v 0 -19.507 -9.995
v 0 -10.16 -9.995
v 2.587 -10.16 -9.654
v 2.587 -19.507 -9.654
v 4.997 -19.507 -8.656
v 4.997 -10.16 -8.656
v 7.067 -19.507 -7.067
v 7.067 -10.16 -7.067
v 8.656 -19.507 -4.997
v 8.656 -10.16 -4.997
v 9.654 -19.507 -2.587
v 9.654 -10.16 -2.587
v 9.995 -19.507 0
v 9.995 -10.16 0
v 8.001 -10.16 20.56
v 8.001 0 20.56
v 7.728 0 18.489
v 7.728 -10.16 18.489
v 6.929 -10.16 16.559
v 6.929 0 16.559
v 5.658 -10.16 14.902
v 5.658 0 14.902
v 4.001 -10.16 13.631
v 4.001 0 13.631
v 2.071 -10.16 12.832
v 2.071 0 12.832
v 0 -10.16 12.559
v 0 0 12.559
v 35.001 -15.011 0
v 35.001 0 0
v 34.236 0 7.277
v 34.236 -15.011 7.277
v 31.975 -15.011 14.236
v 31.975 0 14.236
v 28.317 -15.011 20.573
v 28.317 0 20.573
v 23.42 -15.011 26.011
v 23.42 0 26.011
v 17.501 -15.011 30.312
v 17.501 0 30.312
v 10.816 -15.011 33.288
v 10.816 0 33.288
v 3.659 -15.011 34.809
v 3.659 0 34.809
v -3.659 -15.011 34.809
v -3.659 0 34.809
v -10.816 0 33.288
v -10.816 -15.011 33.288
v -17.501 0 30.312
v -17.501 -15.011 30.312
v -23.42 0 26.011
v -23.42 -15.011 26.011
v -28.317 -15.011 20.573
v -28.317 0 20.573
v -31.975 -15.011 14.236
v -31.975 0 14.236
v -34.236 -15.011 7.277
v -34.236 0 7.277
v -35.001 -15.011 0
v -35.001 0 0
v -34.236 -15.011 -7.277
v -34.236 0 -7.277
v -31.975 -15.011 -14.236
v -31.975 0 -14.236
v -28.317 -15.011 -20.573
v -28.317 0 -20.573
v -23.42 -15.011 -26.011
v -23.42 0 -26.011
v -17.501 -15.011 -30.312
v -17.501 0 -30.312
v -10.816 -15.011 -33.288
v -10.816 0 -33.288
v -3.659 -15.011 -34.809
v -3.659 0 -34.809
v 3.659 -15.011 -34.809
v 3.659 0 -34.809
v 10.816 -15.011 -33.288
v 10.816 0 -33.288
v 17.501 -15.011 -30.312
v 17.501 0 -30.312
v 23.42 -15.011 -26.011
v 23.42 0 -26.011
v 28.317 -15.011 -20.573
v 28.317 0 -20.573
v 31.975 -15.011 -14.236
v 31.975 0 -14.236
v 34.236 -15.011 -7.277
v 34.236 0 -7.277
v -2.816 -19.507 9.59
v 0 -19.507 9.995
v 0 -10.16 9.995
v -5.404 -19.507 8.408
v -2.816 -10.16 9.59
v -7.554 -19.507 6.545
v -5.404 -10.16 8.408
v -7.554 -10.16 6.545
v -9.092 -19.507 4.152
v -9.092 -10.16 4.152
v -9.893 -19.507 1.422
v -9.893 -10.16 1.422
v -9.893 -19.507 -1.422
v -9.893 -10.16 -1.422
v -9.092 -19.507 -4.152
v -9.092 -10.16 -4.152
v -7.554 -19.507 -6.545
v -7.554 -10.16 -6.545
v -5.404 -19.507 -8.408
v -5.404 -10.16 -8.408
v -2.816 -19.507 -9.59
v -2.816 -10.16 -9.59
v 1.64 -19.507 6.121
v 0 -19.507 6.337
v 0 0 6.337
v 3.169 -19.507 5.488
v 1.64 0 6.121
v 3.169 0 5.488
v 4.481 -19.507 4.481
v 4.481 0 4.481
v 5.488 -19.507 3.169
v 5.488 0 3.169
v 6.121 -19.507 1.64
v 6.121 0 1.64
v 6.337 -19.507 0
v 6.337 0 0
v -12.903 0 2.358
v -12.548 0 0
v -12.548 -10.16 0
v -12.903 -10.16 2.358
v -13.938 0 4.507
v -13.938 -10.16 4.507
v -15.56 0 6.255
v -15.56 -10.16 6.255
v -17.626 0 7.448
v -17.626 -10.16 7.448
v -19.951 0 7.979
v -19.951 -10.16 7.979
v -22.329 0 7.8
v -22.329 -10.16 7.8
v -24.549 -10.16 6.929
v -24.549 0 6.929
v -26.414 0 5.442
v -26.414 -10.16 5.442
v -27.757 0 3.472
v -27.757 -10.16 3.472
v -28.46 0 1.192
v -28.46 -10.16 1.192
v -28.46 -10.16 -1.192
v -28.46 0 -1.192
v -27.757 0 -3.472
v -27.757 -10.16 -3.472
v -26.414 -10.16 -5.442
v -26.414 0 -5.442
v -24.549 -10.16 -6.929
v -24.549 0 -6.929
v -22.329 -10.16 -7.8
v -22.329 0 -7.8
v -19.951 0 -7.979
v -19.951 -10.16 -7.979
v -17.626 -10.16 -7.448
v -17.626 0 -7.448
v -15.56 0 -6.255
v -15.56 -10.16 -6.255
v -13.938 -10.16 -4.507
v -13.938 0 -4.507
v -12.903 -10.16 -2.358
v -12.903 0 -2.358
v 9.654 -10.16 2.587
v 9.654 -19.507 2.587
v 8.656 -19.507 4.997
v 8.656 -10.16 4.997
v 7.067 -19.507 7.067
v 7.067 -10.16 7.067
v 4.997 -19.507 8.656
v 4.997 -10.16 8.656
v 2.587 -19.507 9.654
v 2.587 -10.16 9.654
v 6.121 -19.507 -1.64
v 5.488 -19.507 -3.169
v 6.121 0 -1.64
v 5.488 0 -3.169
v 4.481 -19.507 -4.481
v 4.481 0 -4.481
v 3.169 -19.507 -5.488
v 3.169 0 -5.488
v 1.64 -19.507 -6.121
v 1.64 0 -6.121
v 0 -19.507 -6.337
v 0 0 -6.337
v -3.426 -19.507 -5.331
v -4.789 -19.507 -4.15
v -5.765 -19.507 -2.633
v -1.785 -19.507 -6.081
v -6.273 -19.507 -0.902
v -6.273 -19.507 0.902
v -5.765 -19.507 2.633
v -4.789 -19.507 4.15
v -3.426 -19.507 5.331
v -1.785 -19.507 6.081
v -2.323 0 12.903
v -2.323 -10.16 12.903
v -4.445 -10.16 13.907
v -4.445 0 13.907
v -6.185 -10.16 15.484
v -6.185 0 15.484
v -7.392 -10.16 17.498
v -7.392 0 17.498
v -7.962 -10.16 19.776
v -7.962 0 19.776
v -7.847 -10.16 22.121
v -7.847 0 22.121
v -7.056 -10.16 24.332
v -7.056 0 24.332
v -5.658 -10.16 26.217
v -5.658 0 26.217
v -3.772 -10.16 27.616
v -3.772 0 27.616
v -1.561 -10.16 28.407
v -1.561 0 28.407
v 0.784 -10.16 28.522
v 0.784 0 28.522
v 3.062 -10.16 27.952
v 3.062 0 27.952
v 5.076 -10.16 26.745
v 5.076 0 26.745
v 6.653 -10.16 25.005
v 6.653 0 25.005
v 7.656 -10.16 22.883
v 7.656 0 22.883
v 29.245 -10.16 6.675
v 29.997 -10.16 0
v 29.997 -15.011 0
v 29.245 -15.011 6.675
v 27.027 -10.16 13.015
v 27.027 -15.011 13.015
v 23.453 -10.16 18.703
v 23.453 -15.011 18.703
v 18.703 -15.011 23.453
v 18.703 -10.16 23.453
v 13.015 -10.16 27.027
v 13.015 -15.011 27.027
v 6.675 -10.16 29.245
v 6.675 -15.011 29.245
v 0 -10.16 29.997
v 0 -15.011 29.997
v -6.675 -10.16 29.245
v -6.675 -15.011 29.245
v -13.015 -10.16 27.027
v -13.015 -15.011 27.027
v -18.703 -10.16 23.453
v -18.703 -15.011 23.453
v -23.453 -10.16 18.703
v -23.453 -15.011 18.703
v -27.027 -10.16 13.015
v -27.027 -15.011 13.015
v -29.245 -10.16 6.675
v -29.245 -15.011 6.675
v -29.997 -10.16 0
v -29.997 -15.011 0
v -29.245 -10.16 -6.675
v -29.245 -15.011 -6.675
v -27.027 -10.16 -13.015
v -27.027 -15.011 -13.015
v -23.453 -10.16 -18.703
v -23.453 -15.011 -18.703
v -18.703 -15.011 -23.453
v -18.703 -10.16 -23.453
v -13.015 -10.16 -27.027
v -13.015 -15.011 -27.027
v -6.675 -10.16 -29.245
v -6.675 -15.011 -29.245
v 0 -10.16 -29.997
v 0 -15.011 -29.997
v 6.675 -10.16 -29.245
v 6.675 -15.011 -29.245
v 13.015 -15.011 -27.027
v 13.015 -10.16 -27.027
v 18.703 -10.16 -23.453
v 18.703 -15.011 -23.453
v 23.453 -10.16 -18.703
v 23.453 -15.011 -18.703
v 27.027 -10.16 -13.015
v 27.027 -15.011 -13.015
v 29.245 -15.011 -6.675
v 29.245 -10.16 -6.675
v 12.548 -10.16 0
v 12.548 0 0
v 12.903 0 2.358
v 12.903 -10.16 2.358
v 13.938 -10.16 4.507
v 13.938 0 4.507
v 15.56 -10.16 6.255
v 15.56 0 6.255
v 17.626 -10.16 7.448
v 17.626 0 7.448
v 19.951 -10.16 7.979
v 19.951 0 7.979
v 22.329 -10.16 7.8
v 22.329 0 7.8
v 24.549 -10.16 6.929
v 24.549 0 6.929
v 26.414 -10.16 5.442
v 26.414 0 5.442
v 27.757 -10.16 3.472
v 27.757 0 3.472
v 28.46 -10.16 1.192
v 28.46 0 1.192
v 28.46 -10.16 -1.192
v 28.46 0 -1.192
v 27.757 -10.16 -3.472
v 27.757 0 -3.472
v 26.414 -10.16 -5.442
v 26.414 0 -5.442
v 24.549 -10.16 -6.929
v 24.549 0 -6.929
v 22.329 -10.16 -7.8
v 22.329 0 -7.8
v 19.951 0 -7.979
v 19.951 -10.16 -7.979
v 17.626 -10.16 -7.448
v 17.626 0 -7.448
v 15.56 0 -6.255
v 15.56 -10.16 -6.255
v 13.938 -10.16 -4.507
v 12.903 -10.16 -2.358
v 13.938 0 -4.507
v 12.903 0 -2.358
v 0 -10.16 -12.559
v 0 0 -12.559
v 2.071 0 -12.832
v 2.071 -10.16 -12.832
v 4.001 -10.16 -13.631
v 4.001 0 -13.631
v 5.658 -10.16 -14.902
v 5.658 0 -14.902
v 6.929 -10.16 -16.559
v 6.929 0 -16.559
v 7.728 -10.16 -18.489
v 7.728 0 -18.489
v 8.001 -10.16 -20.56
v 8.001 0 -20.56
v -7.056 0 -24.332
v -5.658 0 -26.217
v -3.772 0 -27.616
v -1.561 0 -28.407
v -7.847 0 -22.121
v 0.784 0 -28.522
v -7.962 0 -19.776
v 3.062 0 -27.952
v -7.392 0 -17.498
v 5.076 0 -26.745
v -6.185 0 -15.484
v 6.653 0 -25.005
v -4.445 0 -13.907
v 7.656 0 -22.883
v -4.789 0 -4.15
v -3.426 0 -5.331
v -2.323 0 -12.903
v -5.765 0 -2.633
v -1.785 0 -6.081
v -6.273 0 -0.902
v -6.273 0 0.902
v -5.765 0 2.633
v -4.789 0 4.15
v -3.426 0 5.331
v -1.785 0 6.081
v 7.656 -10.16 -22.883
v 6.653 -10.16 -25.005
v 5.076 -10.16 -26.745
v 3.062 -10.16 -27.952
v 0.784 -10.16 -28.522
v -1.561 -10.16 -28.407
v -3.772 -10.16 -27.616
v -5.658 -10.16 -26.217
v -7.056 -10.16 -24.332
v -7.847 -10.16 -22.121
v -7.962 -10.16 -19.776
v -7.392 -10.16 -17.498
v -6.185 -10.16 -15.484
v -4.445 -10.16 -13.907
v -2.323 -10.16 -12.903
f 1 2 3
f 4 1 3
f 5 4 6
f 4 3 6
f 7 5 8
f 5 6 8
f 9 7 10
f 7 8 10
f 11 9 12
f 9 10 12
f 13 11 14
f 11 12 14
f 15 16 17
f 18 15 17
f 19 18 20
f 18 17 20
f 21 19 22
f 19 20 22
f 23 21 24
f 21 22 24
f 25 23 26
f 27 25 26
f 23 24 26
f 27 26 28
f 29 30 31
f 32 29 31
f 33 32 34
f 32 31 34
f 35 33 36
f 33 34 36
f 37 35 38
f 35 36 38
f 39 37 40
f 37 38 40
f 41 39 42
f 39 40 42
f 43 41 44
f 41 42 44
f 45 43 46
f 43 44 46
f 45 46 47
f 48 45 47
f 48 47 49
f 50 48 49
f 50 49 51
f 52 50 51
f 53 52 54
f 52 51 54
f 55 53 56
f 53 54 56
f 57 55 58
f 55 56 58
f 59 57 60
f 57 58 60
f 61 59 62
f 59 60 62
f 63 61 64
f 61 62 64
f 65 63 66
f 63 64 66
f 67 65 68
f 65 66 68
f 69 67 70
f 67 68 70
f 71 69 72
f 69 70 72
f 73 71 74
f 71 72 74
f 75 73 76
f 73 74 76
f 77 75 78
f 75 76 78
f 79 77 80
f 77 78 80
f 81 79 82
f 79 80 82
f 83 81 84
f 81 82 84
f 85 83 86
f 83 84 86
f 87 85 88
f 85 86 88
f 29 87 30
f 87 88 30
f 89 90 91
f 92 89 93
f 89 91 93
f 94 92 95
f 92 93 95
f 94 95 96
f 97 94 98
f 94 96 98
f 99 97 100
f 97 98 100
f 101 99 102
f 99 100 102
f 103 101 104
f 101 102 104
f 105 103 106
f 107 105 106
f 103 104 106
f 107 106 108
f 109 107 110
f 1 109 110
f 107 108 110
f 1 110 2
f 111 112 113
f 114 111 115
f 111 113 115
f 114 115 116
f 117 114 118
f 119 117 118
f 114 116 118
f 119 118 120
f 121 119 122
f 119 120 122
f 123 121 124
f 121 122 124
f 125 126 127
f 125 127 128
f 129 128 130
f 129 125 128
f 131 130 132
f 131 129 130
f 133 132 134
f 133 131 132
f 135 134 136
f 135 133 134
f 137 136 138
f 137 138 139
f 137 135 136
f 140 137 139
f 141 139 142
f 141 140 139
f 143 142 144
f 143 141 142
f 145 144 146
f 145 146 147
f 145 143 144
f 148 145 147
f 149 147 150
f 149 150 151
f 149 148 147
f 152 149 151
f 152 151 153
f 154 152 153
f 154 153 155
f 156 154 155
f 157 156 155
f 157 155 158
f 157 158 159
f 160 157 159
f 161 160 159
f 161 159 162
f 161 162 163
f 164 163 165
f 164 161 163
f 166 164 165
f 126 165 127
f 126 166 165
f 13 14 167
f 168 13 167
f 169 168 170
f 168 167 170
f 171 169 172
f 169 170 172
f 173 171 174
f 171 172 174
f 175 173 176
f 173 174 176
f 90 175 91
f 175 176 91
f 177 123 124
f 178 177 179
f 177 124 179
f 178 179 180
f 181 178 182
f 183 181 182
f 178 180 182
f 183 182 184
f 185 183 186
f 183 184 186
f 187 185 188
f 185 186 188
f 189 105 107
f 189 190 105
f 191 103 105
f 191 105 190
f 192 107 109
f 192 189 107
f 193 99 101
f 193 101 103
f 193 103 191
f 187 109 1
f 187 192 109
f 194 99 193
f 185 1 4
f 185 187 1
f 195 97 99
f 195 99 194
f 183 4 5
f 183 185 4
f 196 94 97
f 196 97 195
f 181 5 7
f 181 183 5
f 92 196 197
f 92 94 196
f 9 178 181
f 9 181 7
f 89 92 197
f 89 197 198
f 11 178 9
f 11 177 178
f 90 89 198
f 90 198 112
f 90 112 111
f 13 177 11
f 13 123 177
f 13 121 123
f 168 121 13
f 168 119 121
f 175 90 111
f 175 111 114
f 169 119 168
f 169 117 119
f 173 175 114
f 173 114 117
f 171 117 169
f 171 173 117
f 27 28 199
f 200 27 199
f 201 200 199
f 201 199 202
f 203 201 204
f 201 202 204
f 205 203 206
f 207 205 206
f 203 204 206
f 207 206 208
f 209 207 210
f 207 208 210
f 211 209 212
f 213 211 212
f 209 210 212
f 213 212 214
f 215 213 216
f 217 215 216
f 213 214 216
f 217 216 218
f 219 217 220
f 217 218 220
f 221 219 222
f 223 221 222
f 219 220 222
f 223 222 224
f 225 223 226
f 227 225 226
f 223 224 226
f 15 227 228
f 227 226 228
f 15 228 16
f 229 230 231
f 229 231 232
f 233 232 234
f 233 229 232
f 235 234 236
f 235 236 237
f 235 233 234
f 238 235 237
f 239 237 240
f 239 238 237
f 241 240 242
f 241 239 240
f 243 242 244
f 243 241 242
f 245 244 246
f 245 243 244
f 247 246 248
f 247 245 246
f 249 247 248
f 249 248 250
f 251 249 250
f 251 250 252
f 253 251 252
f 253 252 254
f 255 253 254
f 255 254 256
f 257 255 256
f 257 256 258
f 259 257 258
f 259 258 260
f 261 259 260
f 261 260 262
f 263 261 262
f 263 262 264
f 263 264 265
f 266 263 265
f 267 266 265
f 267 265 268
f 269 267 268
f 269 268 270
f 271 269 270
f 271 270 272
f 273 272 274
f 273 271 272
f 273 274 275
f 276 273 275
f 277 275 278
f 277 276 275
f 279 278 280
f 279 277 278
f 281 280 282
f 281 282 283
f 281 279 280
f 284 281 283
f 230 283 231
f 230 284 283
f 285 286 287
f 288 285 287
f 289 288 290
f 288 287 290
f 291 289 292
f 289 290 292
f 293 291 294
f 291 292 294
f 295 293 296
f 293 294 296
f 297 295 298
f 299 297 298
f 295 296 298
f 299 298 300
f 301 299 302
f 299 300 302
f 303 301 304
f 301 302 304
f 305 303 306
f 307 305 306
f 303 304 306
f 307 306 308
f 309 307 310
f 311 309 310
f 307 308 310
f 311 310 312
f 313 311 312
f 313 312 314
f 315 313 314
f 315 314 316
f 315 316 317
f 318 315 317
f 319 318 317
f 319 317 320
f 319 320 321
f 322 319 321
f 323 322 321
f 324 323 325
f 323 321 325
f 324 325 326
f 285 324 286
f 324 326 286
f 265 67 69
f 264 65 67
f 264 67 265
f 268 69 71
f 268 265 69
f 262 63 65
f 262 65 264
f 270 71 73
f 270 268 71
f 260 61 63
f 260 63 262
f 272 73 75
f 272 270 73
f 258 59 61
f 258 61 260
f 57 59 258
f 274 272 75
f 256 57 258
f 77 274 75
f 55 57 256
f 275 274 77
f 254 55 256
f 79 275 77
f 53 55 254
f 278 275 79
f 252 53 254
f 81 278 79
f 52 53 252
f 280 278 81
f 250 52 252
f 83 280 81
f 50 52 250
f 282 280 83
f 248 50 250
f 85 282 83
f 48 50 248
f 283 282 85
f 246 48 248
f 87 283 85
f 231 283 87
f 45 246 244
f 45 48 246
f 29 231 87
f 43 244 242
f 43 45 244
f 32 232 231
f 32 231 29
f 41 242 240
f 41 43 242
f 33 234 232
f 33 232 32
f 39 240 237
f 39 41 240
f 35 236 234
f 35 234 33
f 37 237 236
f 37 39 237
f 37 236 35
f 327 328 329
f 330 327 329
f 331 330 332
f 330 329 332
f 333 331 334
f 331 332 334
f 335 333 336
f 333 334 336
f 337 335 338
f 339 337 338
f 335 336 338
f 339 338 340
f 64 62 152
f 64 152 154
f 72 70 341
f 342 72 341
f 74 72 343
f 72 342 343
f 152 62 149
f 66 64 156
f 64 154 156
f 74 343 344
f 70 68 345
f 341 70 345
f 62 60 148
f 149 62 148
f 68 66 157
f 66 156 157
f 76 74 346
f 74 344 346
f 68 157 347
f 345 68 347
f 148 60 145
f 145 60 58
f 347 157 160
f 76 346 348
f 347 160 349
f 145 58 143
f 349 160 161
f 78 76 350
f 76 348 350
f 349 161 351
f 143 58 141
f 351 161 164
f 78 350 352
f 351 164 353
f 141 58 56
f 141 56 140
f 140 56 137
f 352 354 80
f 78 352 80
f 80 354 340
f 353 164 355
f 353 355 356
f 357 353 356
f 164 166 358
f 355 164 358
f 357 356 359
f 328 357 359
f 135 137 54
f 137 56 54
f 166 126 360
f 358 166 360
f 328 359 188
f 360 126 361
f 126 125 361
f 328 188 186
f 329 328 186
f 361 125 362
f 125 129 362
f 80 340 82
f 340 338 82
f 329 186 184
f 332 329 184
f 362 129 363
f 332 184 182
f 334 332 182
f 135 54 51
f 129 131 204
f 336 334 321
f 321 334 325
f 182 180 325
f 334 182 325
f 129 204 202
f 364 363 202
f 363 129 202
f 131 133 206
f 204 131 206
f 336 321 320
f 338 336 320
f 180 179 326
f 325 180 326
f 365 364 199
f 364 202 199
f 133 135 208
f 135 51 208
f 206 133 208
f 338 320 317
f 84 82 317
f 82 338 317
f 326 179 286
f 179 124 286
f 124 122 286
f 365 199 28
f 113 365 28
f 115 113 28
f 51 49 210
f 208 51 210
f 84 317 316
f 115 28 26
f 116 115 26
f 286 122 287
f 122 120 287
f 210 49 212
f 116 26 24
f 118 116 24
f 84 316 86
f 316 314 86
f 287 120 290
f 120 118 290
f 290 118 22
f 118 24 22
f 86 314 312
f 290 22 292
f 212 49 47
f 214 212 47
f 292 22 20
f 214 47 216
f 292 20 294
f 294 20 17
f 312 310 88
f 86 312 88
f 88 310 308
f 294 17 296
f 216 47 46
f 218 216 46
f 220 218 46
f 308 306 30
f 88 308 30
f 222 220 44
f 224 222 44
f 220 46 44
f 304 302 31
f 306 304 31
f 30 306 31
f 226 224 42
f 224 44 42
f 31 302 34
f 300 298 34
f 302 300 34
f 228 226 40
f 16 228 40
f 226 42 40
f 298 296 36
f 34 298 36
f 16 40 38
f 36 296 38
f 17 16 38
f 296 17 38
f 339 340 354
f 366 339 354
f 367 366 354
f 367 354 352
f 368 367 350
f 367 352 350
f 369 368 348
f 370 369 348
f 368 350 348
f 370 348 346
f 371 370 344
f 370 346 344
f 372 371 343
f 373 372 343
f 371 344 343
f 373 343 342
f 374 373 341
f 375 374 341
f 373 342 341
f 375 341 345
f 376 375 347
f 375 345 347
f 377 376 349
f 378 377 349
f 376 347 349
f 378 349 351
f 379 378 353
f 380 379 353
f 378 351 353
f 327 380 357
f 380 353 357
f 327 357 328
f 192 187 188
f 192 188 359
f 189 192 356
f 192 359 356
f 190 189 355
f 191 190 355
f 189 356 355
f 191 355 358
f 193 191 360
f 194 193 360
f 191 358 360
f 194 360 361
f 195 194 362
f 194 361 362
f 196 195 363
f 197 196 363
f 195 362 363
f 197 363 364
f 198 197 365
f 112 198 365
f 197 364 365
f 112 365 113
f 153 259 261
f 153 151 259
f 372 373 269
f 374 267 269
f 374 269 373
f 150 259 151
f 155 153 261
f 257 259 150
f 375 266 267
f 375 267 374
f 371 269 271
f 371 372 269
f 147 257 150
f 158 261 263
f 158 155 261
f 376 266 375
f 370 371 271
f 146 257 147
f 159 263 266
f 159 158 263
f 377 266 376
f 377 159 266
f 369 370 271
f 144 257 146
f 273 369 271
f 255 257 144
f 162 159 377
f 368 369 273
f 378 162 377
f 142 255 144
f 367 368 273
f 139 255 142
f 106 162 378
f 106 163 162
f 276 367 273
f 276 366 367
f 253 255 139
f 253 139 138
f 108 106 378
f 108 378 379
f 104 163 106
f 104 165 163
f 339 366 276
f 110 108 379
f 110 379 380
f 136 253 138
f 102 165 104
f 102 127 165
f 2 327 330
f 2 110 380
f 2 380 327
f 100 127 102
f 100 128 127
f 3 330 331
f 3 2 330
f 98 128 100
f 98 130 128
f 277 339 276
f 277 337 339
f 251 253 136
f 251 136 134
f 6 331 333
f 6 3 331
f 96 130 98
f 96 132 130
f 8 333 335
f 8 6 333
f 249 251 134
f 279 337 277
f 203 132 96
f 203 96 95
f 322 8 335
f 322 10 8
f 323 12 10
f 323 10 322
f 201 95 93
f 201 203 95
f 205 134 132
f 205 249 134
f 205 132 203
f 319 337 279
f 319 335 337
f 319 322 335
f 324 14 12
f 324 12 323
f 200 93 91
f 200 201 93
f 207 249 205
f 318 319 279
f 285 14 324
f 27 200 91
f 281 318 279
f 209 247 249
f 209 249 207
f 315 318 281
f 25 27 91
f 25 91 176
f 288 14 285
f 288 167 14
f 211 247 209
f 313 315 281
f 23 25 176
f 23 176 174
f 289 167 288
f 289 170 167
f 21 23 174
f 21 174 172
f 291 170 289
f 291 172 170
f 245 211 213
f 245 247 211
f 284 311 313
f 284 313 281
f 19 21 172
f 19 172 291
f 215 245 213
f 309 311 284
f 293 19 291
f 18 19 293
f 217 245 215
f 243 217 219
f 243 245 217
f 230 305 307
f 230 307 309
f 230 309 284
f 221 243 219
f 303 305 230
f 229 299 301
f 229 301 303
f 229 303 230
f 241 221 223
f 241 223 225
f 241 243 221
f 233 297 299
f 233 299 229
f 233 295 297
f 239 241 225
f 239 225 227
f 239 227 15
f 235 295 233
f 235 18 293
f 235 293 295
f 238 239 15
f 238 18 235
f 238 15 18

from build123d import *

# Parameters (mm, degrees)
F0_R     = 29.9974
F0_R_2   = 8.001
F1_DEPTH = 10.16
F0_R_3   = 35.0012
F2_DEPTH = 15.0114
F3_DEPTH = 19.5072


with BuildPart() as f1:
    # F0 (on Front) → F1 (new body)
    with BuildSketch(Plane.XZ):
        Circle(F0_R)
        with BuildLine():
            ThreePointArc((8.001, -20.5599348992), (-5.6575613563, -26.2174962555), (0, -12.5589348992))
            ThreePointArc((0, -12.5589348992), (5.6575613563, -14.9023735429), (8.001, -20.5599348992))
        make_face(mode=Mode.SUBTRACT)
        with Locations((-20.5486, 0)):
            Circle(F0_R_2, mode=Mode.SUBTRACT)
        with BuildLine():
            ThreePointArc((0, 9.9949), (7.0674615673, 7.0674615673), (9.9949, 0))
            ThreePointArc((9.9949, 0), (7.0674615673, -7.0674615673), (0, -9.9949))
            ThreePointArc((0, -9.9949), (-9.9949, 0), (0, 9.9949))
        make_face(mode=Mode.SUBTRACT)
        with BuildLine():
            ThreePointArc((28.5496, 0), (20.5486, -8.001), (12.5476, 0))
            ThreePointArc((12.5476, 0), (20.5486, 8.001), (28.5496, 0))
        make_face(mode=Mode.SUBTRACT)
        with BuildLine():
            ThreePointArc((8.001, 20.5599348992), (5.6575613563, 14.9023735429), (0, 12.5589348992))
            ThreePointArc((0, 12.5589348992), (-5.6575613563, 26.2174962555), (8.001, 20.5599348992))
        make_face(mode=Mode.SUBTRACT)
    extrude(amount=F1_DEPTH)

    # F0 (on Front) → F2 (join)
    with BuildSketch(Plane.XZ):
        Circle(F0_R_3)
        Circle(F0_R, mode=Mode.SUBTRACT)
    extrude(amount=F2_DEPTH)

    # F0 (on Front) → F3 (join)
    with BuildSketch(Plane.XZ):
        with BuildLine():
            Line((9.9949, 0), (6.3373, 0))
            ThreePointArc((6.3373, 0), (4.4811478044, -4.4811478044), (0, -6.3373))
            Line((0, -6.3373), (0, -9.9949))
            ThreePointArc((0, -9.9949), (7.0674615673, -7.0674615673), (9.9949, 0))
        make_face()
        with BuildLine():
            ThreePointArc((0, 6.3373), (4.4811478044, 4.4811478044), (6.3373, 0))
            Line((6.3373, 0), (9.9949, 0))
            ThreePointArc((9.9949, 0), (7.0674615673, 7.0674615673), (0, 9.9949))
            Line((0, 9.9949), (0, 6.3373))
        make_face()
        with BuildLine():
            ThreePointArc((0, -6.3373), (-6.3373, 0), (0, 6.3373))
            Line((0, 6.3373), (0, 9.9949))
            ThreePointArc((0, 9.9949), (-9.9949, 0), (0, -9.9949))
            Line((0, -9.9949), (0, -6.3373))
        make_face()
    extrude(amount=F3_DEPTH)


solid = f1.part
